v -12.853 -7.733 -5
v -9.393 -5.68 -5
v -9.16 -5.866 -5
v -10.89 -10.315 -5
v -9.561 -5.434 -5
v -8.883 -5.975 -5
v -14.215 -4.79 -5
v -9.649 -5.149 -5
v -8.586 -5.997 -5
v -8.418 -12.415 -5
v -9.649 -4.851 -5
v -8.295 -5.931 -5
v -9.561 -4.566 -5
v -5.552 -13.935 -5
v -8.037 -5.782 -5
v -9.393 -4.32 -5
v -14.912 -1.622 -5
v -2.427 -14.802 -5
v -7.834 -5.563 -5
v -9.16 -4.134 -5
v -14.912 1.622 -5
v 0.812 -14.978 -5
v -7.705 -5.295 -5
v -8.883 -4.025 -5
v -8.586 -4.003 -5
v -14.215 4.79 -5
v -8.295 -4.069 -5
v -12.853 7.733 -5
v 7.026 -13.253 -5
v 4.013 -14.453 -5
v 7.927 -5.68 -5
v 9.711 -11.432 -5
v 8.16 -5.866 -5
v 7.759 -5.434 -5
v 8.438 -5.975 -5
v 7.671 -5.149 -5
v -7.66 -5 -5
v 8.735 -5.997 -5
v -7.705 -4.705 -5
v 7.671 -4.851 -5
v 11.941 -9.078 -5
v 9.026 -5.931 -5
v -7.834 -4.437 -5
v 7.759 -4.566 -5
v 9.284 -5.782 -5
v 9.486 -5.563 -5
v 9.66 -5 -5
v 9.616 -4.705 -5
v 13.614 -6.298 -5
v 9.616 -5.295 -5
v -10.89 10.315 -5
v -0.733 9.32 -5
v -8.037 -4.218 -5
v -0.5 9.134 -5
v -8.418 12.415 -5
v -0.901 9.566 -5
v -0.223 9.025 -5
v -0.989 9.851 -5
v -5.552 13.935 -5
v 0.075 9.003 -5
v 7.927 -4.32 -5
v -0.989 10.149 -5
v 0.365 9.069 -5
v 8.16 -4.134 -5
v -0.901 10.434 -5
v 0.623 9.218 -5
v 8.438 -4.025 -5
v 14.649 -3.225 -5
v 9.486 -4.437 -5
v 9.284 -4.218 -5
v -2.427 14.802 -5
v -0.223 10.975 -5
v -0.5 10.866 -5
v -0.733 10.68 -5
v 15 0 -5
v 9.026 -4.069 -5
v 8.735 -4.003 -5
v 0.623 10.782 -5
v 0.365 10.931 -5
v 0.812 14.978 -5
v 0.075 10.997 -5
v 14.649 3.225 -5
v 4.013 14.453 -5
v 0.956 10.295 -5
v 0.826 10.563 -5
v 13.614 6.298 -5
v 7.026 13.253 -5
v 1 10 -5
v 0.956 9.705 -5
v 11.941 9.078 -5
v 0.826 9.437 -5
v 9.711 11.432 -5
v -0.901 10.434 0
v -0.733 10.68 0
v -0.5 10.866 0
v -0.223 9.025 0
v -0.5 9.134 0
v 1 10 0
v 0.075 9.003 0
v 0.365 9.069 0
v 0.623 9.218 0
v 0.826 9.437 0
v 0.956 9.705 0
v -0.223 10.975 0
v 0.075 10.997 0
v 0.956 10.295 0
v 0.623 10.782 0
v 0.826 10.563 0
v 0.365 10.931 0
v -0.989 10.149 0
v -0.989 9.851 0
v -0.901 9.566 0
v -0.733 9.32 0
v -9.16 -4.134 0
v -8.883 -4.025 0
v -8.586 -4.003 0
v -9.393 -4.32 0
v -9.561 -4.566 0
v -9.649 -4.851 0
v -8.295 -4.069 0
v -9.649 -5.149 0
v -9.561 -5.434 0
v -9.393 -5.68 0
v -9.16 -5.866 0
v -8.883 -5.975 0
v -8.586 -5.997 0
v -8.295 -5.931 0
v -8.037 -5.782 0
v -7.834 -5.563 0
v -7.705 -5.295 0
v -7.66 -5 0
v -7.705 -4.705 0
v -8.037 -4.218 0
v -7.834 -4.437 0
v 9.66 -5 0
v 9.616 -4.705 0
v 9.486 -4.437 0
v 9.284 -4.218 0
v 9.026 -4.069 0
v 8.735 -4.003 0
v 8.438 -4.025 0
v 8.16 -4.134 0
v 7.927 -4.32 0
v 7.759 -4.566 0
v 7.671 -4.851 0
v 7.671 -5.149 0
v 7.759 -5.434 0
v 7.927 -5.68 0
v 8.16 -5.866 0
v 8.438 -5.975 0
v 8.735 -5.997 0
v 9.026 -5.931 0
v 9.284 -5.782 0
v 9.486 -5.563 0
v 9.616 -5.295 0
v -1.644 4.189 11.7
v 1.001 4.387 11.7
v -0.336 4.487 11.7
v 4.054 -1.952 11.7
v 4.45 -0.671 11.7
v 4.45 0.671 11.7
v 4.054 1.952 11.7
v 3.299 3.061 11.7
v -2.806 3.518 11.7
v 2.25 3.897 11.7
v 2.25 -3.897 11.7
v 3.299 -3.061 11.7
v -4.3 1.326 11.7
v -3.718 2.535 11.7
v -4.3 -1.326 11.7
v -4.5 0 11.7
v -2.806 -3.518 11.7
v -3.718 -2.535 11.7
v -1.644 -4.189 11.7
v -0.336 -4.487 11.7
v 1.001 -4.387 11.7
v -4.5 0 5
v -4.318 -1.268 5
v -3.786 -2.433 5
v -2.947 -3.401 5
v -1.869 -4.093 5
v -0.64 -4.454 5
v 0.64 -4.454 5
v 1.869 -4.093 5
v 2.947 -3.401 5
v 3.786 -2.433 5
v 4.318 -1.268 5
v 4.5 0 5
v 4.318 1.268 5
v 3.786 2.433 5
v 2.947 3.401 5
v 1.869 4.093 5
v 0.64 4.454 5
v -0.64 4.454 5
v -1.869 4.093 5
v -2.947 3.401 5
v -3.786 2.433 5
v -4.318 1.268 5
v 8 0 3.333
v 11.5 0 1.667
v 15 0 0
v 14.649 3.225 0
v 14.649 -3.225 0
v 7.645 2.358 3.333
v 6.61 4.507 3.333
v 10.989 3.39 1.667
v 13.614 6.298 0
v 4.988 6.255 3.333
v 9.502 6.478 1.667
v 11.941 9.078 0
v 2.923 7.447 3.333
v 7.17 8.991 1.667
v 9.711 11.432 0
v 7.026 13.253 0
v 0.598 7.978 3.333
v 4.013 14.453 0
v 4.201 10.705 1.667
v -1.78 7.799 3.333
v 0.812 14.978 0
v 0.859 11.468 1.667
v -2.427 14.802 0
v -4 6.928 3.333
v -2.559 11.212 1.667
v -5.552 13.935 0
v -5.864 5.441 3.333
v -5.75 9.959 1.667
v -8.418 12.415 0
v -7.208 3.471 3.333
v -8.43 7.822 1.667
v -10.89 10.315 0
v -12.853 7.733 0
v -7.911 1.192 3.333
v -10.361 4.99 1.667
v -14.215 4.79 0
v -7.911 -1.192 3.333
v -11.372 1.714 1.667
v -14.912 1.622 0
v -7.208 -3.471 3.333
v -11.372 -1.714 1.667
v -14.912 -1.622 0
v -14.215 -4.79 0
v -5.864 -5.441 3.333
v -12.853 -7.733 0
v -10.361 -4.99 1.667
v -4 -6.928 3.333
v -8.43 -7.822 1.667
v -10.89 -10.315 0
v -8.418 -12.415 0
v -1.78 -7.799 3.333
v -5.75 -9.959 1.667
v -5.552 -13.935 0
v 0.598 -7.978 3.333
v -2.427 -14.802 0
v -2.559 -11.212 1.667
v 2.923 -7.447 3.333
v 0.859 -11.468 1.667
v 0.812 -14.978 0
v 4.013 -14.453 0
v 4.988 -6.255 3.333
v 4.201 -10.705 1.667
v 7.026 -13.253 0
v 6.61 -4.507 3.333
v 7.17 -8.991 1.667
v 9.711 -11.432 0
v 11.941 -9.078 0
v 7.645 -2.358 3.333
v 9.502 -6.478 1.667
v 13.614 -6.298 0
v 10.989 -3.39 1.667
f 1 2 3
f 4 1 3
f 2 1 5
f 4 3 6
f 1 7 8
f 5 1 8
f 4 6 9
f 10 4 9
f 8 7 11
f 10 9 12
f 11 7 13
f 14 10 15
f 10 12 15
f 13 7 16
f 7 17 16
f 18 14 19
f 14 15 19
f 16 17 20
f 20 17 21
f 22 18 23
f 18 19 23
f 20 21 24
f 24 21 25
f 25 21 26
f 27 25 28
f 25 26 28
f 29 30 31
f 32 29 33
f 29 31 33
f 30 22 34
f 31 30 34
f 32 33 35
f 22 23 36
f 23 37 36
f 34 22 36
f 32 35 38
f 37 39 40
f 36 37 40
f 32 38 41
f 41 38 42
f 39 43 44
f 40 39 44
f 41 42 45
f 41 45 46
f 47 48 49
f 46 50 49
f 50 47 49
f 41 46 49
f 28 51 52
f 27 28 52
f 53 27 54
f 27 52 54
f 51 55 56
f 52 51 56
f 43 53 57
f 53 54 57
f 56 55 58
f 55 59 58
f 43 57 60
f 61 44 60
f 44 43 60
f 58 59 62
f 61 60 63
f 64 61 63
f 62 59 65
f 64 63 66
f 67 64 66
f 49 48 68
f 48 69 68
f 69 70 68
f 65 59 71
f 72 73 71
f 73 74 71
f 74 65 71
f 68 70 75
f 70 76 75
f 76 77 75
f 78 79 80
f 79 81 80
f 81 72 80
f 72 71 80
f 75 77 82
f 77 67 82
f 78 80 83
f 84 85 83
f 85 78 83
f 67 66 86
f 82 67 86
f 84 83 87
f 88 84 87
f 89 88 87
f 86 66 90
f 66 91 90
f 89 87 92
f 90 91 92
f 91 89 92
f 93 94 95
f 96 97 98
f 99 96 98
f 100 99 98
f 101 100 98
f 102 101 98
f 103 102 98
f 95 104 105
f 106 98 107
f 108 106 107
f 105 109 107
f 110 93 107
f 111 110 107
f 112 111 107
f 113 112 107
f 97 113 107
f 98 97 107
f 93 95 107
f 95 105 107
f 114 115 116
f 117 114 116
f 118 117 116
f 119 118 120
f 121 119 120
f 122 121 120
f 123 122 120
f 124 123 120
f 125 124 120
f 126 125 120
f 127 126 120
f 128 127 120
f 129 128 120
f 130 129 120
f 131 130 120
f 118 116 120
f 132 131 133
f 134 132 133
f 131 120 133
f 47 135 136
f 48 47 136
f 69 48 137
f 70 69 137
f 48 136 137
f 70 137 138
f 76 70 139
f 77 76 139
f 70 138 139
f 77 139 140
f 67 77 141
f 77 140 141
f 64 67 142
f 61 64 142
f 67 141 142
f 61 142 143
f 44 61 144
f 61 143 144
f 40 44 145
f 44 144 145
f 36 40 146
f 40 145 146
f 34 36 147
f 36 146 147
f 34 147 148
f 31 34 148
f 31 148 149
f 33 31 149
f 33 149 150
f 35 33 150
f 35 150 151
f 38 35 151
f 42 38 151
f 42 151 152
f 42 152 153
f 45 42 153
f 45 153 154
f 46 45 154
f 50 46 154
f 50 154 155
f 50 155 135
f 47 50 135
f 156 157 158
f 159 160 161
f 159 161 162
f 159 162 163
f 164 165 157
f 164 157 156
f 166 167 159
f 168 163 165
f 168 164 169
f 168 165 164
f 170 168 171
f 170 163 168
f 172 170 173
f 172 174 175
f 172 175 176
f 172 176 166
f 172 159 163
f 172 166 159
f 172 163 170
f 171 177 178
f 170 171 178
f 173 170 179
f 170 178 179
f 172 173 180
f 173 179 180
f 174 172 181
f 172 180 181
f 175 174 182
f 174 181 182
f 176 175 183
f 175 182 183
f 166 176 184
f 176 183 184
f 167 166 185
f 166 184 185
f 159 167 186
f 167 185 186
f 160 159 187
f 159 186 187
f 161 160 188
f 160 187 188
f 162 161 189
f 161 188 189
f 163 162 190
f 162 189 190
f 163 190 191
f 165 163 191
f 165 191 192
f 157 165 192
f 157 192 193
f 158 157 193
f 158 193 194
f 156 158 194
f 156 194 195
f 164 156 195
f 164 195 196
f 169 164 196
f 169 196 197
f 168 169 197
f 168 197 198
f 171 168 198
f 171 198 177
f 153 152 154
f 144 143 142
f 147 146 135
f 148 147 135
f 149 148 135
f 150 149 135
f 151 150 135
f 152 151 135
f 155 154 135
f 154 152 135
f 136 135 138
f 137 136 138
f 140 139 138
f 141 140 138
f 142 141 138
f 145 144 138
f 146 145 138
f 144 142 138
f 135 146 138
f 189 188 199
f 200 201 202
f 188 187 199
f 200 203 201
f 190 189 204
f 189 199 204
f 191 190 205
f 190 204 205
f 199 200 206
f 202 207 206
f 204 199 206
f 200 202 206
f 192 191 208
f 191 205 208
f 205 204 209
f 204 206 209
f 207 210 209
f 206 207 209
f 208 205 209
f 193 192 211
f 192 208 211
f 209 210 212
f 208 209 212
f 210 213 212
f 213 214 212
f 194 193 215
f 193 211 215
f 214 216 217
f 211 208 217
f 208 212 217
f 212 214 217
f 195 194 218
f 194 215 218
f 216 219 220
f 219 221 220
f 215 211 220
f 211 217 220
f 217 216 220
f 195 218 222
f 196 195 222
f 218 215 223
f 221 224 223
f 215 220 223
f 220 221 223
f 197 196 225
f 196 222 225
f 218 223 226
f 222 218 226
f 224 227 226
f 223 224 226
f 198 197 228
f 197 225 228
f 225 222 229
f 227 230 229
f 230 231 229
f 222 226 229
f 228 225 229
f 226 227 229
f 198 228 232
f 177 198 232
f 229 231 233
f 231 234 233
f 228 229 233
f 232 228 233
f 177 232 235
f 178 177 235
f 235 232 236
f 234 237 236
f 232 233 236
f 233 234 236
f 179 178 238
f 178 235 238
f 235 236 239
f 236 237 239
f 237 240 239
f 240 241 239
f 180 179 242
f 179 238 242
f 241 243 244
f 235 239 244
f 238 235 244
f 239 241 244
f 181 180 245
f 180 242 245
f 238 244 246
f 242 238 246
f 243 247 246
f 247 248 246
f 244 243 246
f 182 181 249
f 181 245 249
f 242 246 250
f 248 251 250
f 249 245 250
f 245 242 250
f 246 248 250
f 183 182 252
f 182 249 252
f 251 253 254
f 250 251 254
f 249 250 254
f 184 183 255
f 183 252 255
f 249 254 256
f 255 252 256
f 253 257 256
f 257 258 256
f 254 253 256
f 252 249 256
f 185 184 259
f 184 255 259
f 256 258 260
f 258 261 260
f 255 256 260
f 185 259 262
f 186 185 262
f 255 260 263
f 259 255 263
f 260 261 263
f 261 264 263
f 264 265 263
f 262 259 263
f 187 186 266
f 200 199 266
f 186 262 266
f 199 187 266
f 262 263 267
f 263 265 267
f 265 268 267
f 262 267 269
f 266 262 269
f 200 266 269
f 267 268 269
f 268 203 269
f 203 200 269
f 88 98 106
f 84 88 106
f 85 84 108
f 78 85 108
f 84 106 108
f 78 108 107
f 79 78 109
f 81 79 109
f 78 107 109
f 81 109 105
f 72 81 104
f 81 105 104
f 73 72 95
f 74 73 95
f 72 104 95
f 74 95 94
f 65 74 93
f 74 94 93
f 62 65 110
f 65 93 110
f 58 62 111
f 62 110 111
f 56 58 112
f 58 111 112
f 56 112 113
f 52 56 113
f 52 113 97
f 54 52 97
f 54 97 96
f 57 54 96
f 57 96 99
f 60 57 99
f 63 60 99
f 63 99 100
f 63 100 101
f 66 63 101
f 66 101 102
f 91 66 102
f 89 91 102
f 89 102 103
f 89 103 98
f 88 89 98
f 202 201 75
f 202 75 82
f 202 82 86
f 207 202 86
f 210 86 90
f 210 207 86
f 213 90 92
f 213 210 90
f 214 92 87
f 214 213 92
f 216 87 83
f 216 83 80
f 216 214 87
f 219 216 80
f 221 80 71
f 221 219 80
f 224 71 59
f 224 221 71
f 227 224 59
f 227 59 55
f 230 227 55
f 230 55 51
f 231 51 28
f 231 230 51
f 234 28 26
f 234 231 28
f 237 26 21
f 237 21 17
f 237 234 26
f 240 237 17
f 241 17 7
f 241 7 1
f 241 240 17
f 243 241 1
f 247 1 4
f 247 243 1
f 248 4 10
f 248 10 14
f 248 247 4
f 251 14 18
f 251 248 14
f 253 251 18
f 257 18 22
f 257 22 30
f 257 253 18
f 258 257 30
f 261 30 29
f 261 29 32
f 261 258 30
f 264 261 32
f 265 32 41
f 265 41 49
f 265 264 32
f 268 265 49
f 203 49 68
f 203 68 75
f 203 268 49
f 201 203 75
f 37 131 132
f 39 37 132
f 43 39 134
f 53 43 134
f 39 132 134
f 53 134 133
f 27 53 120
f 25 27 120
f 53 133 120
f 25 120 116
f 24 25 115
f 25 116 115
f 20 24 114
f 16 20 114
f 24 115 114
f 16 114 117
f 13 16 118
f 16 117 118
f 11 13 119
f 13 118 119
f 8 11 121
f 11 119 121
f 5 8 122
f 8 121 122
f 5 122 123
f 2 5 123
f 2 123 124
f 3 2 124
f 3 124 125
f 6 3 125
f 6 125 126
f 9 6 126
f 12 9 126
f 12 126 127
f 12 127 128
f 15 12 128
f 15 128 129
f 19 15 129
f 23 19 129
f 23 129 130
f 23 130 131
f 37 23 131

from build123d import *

# Parameters (mm, degrees)
SKETCH2_R           = 15
BOSS_EXTRUDE2_DEPTH = 5
SKETCH3_R           = 4.5
SKETCH3_2_R         = 4.5
BOSS_EXTRUDE3_DEPTH = 6.7
SKETCH1_R           = 1
CUT_EXTRUDE1_DEPTH  = 25.225812804


with BuildPart() as part:
    # Sketch2 → Boss-Extrude2 (new body)
    with BuildSketch(Plane.XY):
        Circle(SKETCH2_R)
    extrude(amount=-BOSS_EXTRUDE2_DEPTH)

    # Sketch3 → section 0 of loft1
    with BuildSketch(Plane.XY.offset(5), mode=Mode.PRIVATE) as loft1_s0:
        Circle(SKETCH3_R)
    # loft up to a face of the part (loft1)
    loft([loft1_s0.sketch, Face(Wire([part.edges().sort_by_distance((-10.268206589, 10.934529411, 0))[0]]))])

    # Sketch3<2> → Boss-Extrude3 (add)
    with BuildSketch(Plane.XY.offset(5)):
        Circle(SKETCH3_2_R)
    extrude(amount=BOSS_EXTRUDE3_DEPTH)

    # Sketch1 → Cut-Extrude1 (cut, through all)
    with BuildSketch(Plane.XY):
        with Locations((0, 10)):
            Circle(SKETCH1_R)
        with Locations((-8.660254038, -5)):
            Circle(SKETCH1_R)
        with Locations((8.660254038, -5)):
            Circle(SKETCH1_R)
    extrude(amount=-CUT_EXTRUDE1_DEPTH, mode=Mode.SUBTRACT)


solid = part.part
